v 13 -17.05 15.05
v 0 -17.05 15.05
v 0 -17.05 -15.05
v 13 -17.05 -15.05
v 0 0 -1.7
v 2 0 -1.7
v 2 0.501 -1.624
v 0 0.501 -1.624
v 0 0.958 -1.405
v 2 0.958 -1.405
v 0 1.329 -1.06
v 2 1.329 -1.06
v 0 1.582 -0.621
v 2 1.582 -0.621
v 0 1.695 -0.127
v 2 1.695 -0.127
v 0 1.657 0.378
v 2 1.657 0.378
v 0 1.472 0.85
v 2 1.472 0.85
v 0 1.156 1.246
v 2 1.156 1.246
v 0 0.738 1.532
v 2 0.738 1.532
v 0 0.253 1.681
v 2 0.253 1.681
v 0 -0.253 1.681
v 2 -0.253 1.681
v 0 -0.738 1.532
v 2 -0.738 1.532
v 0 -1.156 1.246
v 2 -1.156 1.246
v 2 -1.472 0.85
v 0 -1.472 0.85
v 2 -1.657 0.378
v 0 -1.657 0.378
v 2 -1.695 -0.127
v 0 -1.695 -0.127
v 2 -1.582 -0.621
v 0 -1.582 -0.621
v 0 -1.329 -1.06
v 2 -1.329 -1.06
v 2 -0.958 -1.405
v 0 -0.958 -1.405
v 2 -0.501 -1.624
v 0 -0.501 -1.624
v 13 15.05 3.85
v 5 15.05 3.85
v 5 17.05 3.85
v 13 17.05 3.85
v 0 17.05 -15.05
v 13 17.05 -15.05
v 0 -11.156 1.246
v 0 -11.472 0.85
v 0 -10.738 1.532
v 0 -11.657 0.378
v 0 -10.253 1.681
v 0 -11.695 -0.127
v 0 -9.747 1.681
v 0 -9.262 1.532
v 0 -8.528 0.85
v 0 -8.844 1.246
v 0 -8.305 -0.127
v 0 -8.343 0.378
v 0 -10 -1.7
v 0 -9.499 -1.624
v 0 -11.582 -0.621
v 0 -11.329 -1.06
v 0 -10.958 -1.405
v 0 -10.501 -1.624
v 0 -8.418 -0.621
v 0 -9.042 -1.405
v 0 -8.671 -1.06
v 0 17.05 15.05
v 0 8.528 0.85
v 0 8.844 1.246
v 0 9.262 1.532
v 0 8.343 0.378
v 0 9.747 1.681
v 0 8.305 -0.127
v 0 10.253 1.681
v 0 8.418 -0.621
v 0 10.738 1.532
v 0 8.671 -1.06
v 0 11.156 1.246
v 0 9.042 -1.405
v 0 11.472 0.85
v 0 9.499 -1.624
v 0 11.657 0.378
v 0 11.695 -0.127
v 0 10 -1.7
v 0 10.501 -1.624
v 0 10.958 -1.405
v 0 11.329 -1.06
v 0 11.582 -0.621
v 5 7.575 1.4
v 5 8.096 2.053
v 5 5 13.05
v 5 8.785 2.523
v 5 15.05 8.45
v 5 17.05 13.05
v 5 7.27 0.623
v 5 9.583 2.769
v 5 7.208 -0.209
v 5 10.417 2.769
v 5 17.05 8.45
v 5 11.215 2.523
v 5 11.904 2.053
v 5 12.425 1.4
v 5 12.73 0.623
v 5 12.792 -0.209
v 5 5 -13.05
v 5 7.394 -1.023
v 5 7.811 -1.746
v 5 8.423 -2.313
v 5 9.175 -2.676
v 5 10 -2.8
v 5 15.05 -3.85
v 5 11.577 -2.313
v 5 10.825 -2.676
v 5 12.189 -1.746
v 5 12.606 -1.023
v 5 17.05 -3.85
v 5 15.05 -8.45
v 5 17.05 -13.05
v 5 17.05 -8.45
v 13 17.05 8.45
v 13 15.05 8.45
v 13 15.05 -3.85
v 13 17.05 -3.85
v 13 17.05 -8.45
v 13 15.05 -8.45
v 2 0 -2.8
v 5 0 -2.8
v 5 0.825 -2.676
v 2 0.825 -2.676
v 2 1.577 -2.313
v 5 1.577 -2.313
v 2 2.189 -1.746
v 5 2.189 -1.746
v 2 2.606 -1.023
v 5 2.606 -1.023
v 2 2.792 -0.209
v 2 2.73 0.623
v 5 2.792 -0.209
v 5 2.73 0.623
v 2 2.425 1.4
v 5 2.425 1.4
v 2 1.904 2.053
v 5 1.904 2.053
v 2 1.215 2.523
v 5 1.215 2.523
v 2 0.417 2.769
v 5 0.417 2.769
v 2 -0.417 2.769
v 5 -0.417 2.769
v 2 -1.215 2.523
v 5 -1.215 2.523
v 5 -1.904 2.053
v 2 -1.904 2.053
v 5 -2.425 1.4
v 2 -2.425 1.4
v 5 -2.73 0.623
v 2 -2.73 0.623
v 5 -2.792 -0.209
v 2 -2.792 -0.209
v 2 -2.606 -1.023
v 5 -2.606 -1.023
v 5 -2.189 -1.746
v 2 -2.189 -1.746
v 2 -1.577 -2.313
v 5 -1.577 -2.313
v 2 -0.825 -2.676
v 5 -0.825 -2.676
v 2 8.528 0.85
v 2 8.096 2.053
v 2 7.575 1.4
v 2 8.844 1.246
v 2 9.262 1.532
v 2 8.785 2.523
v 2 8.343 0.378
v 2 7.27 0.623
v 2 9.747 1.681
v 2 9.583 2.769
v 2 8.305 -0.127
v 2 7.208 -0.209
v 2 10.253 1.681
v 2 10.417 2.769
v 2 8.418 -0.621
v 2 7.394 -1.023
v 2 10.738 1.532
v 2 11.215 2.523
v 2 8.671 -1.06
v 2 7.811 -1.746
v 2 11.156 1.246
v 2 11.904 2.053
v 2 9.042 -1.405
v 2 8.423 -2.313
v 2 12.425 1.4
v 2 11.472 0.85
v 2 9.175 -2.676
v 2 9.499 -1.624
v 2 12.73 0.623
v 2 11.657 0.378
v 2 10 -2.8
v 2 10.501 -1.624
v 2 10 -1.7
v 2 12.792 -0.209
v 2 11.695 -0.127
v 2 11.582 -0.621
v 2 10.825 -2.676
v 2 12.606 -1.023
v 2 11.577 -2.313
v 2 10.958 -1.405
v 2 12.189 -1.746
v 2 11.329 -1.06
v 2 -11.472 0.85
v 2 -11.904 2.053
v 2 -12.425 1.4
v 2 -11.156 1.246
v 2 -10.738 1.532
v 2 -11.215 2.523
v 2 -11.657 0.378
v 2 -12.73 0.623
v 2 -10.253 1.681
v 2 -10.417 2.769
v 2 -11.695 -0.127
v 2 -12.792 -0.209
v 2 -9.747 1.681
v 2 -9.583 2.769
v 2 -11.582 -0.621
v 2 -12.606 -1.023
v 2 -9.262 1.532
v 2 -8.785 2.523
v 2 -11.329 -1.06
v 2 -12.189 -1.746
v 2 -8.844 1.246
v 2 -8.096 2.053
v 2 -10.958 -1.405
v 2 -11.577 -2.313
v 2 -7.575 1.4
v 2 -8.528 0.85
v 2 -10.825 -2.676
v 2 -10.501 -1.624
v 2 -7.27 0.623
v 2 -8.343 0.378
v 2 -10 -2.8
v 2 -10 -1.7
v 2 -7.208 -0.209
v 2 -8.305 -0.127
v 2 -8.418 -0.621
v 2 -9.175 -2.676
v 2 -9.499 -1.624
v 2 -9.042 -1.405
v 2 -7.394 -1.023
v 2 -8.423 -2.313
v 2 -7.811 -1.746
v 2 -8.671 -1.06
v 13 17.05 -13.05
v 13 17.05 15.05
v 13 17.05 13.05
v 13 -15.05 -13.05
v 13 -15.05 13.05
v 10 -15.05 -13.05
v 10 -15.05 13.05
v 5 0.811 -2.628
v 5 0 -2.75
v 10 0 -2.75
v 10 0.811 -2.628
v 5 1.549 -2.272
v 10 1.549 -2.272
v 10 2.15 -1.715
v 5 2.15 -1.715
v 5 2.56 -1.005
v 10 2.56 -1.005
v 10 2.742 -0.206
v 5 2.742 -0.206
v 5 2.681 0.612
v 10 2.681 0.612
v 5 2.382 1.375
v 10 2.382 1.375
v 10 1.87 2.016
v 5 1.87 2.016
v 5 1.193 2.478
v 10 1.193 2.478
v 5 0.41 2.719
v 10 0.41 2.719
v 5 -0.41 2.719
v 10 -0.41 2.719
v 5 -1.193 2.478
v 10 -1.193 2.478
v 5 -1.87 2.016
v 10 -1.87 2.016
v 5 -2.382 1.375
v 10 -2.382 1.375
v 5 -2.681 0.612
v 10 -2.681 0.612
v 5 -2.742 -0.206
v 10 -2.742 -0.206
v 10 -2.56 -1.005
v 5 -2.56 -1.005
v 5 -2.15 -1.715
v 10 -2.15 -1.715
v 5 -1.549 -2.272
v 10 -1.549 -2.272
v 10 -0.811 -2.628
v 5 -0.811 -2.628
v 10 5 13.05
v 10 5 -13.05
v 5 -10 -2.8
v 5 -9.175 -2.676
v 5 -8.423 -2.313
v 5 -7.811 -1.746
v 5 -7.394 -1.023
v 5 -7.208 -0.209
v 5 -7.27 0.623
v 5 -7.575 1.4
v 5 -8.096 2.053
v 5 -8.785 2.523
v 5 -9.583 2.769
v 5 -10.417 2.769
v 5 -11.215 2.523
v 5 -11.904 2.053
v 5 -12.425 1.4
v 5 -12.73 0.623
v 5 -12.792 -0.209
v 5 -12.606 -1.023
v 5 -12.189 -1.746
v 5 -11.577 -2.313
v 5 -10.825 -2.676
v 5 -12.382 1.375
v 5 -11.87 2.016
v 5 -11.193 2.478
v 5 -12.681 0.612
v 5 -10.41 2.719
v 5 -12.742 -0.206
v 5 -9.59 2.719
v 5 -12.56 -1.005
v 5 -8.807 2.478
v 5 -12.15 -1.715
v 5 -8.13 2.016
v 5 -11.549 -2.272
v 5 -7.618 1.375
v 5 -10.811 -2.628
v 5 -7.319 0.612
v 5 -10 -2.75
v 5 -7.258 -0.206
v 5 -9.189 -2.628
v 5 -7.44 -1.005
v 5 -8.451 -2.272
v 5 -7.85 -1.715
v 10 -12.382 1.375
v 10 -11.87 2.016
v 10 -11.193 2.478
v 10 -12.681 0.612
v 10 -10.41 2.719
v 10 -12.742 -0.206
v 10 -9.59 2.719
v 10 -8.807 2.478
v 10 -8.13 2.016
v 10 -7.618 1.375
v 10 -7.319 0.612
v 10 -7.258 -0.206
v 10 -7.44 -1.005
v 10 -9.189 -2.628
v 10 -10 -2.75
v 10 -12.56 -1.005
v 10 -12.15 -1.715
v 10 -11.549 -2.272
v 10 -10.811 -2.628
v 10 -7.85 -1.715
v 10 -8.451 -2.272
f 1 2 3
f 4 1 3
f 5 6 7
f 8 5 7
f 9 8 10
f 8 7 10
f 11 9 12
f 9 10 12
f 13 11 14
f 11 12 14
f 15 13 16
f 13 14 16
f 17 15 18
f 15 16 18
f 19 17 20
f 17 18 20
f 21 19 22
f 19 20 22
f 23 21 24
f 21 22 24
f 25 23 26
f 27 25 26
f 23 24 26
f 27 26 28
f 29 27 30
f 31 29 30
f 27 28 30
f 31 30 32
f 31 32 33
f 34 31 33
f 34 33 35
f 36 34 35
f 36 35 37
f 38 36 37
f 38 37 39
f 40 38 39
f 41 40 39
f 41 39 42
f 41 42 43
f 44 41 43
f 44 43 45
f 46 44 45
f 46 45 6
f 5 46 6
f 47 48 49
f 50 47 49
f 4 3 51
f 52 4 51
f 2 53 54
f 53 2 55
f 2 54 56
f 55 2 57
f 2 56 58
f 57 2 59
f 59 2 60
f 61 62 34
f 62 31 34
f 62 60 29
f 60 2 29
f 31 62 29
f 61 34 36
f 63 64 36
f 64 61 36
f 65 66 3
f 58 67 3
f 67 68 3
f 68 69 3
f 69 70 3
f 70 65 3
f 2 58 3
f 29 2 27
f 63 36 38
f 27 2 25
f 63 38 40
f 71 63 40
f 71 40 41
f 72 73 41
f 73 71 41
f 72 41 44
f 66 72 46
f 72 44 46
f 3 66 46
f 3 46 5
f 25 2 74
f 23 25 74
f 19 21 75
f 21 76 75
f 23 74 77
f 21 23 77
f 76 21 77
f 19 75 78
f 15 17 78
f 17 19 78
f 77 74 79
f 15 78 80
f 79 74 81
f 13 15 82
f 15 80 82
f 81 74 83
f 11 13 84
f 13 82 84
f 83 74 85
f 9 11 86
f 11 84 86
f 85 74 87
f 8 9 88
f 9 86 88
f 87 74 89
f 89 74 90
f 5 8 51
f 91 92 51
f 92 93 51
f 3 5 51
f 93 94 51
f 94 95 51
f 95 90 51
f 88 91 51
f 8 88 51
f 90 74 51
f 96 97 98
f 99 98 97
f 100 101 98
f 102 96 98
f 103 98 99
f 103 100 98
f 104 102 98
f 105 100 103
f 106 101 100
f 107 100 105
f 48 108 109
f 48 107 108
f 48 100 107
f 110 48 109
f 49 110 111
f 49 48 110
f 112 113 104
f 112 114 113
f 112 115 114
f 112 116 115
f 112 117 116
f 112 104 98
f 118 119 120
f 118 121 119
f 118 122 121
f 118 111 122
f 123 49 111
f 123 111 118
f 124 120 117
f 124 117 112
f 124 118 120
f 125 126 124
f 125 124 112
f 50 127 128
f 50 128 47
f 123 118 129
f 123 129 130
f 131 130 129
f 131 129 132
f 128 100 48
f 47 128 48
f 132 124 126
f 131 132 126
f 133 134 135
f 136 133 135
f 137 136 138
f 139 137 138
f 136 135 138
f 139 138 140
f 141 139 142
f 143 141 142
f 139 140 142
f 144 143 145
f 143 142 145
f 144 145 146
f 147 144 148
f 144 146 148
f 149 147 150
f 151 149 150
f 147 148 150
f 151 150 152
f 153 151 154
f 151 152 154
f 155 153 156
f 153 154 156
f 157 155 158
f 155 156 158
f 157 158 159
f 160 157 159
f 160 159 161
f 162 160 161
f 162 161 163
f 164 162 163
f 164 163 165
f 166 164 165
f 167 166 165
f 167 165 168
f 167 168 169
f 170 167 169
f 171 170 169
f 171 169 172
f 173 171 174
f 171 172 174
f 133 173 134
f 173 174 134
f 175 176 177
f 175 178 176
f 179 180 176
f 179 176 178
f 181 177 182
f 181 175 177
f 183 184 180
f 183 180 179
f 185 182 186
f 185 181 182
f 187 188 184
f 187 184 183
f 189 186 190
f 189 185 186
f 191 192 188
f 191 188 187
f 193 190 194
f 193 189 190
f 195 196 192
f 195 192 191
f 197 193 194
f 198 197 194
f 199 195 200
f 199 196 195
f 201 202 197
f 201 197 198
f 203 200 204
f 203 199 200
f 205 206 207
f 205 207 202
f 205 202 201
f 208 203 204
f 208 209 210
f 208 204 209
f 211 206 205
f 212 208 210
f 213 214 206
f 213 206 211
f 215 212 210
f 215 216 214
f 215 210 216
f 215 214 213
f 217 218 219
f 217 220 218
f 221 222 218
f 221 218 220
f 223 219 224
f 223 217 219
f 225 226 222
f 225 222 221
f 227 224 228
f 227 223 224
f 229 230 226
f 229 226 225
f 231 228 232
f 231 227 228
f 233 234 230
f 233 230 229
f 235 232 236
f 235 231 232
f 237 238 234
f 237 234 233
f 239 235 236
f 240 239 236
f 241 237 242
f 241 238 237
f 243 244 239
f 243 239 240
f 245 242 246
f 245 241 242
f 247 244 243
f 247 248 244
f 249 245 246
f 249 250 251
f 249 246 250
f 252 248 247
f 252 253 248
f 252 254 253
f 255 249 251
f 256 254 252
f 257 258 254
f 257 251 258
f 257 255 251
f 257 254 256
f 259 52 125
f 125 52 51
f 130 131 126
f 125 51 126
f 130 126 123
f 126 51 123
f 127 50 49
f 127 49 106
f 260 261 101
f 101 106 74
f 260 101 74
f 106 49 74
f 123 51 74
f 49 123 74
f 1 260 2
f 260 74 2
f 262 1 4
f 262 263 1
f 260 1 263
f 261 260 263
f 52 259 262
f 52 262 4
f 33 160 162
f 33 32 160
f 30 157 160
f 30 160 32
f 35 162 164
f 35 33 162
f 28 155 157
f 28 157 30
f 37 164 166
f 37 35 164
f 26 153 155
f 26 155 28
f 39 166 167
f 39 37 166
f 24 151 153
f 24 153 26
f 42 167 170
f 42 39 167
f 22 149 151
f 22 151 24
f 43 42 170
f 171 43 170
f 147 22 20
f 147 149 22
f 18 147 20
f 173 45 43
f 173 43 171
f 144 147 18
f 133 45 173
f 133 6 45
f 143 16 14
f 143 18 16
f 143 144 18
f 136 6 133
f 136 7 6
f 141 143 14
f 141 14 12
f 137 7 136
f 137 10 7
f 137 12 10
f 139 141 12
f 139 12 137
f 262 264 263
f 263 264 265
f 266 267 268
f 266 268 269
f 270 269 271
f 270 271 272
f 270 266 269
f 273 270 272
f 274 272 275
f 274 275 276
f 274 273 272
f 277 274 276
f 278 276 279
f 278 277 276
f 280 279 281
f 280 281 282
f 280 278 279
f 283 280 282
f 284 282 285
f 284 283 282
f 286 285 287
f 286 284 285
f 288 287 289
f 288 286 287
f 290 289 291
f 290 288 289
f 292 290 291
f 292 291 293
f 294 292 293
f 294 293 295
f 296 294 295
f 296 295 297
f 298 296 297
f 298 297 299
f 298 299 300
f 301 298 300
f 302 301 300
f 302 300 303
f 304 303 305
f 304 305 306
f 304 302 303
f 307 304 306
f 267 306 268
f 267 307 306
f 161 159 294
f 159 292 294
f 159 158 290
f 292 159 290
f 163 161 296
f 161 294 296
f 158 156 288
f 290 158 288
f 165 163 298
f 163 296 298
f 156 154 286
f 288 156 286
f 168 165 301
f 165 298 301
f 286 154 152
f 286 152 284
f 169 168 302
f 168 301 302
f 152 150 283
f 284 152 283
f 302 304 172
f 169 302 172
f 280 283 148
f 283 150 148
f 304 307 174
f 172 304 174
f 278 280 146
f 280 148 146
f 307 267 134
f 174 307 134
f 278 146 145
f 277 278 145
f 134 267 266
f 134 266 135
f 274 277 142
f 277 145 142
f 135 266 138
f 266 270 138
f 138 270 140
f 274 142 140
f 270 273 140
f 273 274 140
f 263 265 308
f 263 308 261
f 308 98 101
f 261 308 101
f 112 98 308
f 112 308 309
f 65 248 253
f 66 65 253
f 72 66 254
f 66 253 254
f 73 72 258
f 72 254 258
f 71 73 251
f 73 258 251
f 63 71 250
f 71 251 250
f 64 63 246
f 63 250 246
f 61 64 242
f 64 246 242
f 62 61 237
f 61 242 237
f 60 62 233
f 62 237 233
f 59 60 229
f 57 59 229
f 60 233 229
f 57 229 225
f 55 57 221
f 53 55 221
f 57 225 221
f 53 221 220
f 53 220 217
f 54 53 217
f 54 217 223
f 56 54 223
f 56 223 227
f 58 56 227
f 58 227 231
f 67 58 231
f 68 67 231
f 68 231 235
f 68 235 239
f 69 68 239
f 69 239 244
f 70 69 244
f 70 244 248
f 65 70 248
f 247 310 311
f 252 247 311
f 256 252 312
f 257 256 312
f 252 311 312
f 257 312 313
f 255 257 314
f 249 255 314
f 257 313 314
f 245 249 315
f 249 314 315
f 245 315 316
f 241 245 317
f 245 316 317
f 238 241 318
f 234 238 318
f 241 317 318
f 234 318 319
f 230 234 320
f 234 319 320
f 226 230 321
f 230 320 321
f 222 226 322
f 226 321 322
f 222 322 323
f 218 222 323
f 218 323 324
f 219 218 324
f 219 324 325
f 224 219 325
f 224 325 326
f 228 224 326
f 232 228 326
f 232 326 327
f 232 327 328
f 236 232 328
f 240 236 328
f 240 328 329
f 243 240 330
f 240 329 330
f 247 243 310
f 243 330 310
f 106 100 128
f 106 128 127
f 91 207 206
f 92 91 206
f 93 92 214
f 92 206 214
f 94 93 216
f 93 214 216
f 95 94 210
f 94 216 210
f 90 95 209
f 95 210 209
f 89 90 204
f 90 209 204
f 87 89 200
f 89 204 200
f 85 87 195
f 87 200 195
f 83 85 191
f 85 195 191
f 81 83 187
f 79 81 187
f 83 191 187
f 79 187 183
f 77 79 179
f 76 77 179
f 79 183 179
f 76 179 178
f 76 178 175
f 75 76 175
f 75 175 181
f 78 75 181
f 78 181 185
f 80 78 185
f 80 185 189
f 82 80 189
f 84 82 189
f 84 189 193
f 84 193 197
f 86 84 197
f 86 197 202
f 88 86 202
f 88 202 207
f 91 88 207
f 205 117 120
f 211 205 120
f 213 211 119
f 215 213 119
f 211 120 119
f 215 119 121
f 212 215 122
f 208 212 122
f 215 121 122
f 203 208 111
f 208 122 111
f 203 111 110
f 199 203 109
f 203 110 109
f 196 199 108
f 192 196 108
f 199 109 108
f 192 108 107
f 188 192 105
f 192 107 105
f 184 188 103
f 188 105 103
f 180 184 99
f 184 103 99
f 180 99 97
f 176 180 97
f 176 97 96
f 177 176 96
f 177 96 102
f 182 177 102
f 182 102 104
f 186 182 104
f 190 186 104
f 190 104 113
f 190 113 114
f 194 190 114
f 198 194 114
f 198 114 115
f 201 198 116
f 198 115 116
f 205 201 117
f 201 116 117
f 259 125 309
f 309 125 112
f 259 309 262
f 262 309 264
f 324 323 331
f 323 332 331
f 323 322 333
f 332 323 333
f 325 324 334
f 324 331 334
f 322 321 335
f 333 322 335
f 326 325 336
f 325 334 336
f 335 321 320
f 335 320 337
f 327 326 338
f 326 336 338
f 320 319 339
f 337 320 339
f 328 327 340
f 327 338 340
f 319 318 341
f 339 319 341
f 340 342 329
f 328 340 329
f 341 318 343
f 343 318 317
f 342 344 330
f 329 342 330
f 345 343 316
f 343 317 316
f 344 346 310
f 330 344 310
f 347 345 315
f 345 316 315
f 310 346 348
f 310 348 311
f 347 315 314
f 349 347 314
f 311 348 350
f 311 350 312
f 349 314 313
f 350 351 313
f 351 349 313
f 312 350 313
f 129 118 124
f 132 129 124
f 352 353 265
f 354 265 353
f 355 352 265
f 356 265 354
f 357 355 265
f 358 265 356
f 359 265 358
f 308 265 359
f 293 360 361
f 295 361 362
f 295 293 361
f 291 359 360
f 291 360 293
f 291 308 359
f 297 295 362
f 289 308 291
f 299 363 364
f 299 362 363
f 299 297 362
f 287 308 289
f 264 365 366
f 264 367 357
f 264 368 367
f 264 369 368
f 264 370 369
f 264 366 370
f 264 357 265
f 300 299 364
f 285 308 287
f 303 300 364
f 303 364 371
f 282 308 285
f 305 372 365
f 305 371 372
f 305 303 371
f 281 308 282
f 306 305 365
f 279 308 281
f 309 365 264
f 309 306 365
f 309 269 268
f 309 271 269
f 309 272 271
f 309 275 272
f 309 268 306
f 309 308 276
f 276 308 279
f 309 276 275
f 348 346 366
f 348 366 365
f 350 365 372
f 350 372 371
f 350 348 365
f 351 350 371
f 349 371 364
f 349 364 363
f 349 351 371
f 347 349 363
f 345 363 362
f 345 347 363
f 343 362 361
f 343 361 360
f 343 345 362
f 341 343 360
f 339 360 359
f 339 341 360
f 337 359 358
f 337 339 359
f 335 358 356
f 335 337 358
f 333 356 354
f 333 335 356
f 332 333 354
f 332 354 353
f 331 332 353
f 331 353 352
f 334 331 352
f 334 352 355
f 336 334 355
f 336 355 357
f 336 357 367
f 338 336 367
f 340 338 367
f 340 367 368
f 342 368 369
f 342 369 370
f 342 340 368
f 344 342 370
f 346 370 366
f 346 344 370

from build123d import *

# Parameters (mm, degrees)
SKETCH1_W           = 30.1
SKETCH1_H           = 34.1
SKETCH1_W_2         = 26.1
SKETCH1_H_2         = 30.1
BOSS_EXTRUDE1_DEPTH = 5
SKETCH2_W           = 10.8
SKETCH2_H           = 2
SKETCH2_W_2         = 4.6
BOSS_EXTRUDE2_DEPTH = 8
SKETCH3_R           = 1.7
CUT_EXTRUDE1_DEPTH  = 25.108193628
SKETCH4_R           = 2.8
CUT_EXTRUDE2_DEPTH  = 3
SKETCH6_W           = 26.1
SKETCH6_H           = 20.05
SKETCH6_R           = 2.75
BOSS_EXTRUDE3_DEPTH = 5


with BuildPart() as part:
    # Sketch1 → Boss-Extrude1 (new body)
    # profile 1 of 2: a face of its own
    with BuildSketch(Plane(origin=(0, 0, 0), x_dir=(0, 0, -1), z_dir=(1, 0, 0))):
        Rectangle(SKETCH1_W, SKETCH1_H)
        Rectangle(SKETCH1_W_2, SKETCH1_H_2, mode=Mode.SUBTRACT)
    # profile 2 of 2: a face of its own
    with BuildSketch(Plane(origin=(0, 0, 0), x_dir=(0, 0, -1), z_dir=(1, 0, 0))):
        Rectangle(SKETCH1_W_2, SKETCH1_H_2)
    extrude(amount=BOSS_EXTRUDE1_DEPTH)

    # Sketch2 → Boss-Extrude2 (add)
    with BuildSketch(Plane(origin=(5, 0, 0), x_dir=(0, 0, -1), z_dir=(1, 0, 0))):
        with Locations((7.65, -16.05)):
            Rectangle(SKETCH2_W, SKETCH2_H)
        Polygon((13.05, 15.05), (13.05, -15.05), (13.05, -17.05), (15.05, -17.05), (15.05, 17.05), (13.05, 17.05), align=None)
        with Locations((6.15, 16.05)):
            Rectangle(SKETCH2_W_2, SKETCH2_H)
        with Locations((-6.15, 16.05)):
            Rectangle(SKETCH2_W_2, SKETCH2_H)
        Polygon((-13.05, -15.05), (-13.05, 15.05), (-13.05, 17.05), (-15.05, 17.05), (-15.05, -17.05), (2.25, -17.05), (2.25, -15.05), align=None)
    extrude(amount=BOSS_EXTRUDE2_DEPTH)

    # Sketch3 → Cut-Extrude1 (cut, through all)
    with BuildSketch(Plane(origin=(5, 0, 0), x_dir=(0, 0, -1), z_dir=(1, 0, 0))):
        with Locations((0, -10)):
            Circle(SKETCH3_R)
        Circle(SKETCH3_R)
        with Locations((0, 10)):
            Circle(SKETCH3_R)
    extrude(amount=-CUT_EXTRUDE1_DEPTH, mode=Mode.SUBTRACT)

    # Sketch4 → Cut-Extrude2 (cut)
    with BuildSketch(Plane(origin=(5, 0, 0), x_dir=(0, 0, -1), z_dir=(1, 0, 0))):
        with Locations((0, -10)):
            Circle(SKETCH4_R)
        Circle(SKETCH4_R)
        with Locations((0, 10)):
            Circle(SKETCH4_R)
    extrude(amount=-CUT_EXTRUDE2_DEPTH, mode=Mode.SUBTRACT)

    # Sketch6 → Boss-Extrude3 (add)
    with BuildSketch(Plane(origin=(5, 0, 0), x_dir=(0, 0, -1), z_dir=(1, 0, 0))):
        with Locations((0, -5.025)):
            Rectangle(SKETCH6_W, SKETCH6_H)
        Circle(SKETCH6_R, mode=Mode.SUBTRACT)
        with Locations((0, -10)):
            Circle(SKETCH6_R, mode=Mode.SUBTRACT)
    extrude(amount=BOSS_EXTRUDE3_DEPTH)


solid = part.part
